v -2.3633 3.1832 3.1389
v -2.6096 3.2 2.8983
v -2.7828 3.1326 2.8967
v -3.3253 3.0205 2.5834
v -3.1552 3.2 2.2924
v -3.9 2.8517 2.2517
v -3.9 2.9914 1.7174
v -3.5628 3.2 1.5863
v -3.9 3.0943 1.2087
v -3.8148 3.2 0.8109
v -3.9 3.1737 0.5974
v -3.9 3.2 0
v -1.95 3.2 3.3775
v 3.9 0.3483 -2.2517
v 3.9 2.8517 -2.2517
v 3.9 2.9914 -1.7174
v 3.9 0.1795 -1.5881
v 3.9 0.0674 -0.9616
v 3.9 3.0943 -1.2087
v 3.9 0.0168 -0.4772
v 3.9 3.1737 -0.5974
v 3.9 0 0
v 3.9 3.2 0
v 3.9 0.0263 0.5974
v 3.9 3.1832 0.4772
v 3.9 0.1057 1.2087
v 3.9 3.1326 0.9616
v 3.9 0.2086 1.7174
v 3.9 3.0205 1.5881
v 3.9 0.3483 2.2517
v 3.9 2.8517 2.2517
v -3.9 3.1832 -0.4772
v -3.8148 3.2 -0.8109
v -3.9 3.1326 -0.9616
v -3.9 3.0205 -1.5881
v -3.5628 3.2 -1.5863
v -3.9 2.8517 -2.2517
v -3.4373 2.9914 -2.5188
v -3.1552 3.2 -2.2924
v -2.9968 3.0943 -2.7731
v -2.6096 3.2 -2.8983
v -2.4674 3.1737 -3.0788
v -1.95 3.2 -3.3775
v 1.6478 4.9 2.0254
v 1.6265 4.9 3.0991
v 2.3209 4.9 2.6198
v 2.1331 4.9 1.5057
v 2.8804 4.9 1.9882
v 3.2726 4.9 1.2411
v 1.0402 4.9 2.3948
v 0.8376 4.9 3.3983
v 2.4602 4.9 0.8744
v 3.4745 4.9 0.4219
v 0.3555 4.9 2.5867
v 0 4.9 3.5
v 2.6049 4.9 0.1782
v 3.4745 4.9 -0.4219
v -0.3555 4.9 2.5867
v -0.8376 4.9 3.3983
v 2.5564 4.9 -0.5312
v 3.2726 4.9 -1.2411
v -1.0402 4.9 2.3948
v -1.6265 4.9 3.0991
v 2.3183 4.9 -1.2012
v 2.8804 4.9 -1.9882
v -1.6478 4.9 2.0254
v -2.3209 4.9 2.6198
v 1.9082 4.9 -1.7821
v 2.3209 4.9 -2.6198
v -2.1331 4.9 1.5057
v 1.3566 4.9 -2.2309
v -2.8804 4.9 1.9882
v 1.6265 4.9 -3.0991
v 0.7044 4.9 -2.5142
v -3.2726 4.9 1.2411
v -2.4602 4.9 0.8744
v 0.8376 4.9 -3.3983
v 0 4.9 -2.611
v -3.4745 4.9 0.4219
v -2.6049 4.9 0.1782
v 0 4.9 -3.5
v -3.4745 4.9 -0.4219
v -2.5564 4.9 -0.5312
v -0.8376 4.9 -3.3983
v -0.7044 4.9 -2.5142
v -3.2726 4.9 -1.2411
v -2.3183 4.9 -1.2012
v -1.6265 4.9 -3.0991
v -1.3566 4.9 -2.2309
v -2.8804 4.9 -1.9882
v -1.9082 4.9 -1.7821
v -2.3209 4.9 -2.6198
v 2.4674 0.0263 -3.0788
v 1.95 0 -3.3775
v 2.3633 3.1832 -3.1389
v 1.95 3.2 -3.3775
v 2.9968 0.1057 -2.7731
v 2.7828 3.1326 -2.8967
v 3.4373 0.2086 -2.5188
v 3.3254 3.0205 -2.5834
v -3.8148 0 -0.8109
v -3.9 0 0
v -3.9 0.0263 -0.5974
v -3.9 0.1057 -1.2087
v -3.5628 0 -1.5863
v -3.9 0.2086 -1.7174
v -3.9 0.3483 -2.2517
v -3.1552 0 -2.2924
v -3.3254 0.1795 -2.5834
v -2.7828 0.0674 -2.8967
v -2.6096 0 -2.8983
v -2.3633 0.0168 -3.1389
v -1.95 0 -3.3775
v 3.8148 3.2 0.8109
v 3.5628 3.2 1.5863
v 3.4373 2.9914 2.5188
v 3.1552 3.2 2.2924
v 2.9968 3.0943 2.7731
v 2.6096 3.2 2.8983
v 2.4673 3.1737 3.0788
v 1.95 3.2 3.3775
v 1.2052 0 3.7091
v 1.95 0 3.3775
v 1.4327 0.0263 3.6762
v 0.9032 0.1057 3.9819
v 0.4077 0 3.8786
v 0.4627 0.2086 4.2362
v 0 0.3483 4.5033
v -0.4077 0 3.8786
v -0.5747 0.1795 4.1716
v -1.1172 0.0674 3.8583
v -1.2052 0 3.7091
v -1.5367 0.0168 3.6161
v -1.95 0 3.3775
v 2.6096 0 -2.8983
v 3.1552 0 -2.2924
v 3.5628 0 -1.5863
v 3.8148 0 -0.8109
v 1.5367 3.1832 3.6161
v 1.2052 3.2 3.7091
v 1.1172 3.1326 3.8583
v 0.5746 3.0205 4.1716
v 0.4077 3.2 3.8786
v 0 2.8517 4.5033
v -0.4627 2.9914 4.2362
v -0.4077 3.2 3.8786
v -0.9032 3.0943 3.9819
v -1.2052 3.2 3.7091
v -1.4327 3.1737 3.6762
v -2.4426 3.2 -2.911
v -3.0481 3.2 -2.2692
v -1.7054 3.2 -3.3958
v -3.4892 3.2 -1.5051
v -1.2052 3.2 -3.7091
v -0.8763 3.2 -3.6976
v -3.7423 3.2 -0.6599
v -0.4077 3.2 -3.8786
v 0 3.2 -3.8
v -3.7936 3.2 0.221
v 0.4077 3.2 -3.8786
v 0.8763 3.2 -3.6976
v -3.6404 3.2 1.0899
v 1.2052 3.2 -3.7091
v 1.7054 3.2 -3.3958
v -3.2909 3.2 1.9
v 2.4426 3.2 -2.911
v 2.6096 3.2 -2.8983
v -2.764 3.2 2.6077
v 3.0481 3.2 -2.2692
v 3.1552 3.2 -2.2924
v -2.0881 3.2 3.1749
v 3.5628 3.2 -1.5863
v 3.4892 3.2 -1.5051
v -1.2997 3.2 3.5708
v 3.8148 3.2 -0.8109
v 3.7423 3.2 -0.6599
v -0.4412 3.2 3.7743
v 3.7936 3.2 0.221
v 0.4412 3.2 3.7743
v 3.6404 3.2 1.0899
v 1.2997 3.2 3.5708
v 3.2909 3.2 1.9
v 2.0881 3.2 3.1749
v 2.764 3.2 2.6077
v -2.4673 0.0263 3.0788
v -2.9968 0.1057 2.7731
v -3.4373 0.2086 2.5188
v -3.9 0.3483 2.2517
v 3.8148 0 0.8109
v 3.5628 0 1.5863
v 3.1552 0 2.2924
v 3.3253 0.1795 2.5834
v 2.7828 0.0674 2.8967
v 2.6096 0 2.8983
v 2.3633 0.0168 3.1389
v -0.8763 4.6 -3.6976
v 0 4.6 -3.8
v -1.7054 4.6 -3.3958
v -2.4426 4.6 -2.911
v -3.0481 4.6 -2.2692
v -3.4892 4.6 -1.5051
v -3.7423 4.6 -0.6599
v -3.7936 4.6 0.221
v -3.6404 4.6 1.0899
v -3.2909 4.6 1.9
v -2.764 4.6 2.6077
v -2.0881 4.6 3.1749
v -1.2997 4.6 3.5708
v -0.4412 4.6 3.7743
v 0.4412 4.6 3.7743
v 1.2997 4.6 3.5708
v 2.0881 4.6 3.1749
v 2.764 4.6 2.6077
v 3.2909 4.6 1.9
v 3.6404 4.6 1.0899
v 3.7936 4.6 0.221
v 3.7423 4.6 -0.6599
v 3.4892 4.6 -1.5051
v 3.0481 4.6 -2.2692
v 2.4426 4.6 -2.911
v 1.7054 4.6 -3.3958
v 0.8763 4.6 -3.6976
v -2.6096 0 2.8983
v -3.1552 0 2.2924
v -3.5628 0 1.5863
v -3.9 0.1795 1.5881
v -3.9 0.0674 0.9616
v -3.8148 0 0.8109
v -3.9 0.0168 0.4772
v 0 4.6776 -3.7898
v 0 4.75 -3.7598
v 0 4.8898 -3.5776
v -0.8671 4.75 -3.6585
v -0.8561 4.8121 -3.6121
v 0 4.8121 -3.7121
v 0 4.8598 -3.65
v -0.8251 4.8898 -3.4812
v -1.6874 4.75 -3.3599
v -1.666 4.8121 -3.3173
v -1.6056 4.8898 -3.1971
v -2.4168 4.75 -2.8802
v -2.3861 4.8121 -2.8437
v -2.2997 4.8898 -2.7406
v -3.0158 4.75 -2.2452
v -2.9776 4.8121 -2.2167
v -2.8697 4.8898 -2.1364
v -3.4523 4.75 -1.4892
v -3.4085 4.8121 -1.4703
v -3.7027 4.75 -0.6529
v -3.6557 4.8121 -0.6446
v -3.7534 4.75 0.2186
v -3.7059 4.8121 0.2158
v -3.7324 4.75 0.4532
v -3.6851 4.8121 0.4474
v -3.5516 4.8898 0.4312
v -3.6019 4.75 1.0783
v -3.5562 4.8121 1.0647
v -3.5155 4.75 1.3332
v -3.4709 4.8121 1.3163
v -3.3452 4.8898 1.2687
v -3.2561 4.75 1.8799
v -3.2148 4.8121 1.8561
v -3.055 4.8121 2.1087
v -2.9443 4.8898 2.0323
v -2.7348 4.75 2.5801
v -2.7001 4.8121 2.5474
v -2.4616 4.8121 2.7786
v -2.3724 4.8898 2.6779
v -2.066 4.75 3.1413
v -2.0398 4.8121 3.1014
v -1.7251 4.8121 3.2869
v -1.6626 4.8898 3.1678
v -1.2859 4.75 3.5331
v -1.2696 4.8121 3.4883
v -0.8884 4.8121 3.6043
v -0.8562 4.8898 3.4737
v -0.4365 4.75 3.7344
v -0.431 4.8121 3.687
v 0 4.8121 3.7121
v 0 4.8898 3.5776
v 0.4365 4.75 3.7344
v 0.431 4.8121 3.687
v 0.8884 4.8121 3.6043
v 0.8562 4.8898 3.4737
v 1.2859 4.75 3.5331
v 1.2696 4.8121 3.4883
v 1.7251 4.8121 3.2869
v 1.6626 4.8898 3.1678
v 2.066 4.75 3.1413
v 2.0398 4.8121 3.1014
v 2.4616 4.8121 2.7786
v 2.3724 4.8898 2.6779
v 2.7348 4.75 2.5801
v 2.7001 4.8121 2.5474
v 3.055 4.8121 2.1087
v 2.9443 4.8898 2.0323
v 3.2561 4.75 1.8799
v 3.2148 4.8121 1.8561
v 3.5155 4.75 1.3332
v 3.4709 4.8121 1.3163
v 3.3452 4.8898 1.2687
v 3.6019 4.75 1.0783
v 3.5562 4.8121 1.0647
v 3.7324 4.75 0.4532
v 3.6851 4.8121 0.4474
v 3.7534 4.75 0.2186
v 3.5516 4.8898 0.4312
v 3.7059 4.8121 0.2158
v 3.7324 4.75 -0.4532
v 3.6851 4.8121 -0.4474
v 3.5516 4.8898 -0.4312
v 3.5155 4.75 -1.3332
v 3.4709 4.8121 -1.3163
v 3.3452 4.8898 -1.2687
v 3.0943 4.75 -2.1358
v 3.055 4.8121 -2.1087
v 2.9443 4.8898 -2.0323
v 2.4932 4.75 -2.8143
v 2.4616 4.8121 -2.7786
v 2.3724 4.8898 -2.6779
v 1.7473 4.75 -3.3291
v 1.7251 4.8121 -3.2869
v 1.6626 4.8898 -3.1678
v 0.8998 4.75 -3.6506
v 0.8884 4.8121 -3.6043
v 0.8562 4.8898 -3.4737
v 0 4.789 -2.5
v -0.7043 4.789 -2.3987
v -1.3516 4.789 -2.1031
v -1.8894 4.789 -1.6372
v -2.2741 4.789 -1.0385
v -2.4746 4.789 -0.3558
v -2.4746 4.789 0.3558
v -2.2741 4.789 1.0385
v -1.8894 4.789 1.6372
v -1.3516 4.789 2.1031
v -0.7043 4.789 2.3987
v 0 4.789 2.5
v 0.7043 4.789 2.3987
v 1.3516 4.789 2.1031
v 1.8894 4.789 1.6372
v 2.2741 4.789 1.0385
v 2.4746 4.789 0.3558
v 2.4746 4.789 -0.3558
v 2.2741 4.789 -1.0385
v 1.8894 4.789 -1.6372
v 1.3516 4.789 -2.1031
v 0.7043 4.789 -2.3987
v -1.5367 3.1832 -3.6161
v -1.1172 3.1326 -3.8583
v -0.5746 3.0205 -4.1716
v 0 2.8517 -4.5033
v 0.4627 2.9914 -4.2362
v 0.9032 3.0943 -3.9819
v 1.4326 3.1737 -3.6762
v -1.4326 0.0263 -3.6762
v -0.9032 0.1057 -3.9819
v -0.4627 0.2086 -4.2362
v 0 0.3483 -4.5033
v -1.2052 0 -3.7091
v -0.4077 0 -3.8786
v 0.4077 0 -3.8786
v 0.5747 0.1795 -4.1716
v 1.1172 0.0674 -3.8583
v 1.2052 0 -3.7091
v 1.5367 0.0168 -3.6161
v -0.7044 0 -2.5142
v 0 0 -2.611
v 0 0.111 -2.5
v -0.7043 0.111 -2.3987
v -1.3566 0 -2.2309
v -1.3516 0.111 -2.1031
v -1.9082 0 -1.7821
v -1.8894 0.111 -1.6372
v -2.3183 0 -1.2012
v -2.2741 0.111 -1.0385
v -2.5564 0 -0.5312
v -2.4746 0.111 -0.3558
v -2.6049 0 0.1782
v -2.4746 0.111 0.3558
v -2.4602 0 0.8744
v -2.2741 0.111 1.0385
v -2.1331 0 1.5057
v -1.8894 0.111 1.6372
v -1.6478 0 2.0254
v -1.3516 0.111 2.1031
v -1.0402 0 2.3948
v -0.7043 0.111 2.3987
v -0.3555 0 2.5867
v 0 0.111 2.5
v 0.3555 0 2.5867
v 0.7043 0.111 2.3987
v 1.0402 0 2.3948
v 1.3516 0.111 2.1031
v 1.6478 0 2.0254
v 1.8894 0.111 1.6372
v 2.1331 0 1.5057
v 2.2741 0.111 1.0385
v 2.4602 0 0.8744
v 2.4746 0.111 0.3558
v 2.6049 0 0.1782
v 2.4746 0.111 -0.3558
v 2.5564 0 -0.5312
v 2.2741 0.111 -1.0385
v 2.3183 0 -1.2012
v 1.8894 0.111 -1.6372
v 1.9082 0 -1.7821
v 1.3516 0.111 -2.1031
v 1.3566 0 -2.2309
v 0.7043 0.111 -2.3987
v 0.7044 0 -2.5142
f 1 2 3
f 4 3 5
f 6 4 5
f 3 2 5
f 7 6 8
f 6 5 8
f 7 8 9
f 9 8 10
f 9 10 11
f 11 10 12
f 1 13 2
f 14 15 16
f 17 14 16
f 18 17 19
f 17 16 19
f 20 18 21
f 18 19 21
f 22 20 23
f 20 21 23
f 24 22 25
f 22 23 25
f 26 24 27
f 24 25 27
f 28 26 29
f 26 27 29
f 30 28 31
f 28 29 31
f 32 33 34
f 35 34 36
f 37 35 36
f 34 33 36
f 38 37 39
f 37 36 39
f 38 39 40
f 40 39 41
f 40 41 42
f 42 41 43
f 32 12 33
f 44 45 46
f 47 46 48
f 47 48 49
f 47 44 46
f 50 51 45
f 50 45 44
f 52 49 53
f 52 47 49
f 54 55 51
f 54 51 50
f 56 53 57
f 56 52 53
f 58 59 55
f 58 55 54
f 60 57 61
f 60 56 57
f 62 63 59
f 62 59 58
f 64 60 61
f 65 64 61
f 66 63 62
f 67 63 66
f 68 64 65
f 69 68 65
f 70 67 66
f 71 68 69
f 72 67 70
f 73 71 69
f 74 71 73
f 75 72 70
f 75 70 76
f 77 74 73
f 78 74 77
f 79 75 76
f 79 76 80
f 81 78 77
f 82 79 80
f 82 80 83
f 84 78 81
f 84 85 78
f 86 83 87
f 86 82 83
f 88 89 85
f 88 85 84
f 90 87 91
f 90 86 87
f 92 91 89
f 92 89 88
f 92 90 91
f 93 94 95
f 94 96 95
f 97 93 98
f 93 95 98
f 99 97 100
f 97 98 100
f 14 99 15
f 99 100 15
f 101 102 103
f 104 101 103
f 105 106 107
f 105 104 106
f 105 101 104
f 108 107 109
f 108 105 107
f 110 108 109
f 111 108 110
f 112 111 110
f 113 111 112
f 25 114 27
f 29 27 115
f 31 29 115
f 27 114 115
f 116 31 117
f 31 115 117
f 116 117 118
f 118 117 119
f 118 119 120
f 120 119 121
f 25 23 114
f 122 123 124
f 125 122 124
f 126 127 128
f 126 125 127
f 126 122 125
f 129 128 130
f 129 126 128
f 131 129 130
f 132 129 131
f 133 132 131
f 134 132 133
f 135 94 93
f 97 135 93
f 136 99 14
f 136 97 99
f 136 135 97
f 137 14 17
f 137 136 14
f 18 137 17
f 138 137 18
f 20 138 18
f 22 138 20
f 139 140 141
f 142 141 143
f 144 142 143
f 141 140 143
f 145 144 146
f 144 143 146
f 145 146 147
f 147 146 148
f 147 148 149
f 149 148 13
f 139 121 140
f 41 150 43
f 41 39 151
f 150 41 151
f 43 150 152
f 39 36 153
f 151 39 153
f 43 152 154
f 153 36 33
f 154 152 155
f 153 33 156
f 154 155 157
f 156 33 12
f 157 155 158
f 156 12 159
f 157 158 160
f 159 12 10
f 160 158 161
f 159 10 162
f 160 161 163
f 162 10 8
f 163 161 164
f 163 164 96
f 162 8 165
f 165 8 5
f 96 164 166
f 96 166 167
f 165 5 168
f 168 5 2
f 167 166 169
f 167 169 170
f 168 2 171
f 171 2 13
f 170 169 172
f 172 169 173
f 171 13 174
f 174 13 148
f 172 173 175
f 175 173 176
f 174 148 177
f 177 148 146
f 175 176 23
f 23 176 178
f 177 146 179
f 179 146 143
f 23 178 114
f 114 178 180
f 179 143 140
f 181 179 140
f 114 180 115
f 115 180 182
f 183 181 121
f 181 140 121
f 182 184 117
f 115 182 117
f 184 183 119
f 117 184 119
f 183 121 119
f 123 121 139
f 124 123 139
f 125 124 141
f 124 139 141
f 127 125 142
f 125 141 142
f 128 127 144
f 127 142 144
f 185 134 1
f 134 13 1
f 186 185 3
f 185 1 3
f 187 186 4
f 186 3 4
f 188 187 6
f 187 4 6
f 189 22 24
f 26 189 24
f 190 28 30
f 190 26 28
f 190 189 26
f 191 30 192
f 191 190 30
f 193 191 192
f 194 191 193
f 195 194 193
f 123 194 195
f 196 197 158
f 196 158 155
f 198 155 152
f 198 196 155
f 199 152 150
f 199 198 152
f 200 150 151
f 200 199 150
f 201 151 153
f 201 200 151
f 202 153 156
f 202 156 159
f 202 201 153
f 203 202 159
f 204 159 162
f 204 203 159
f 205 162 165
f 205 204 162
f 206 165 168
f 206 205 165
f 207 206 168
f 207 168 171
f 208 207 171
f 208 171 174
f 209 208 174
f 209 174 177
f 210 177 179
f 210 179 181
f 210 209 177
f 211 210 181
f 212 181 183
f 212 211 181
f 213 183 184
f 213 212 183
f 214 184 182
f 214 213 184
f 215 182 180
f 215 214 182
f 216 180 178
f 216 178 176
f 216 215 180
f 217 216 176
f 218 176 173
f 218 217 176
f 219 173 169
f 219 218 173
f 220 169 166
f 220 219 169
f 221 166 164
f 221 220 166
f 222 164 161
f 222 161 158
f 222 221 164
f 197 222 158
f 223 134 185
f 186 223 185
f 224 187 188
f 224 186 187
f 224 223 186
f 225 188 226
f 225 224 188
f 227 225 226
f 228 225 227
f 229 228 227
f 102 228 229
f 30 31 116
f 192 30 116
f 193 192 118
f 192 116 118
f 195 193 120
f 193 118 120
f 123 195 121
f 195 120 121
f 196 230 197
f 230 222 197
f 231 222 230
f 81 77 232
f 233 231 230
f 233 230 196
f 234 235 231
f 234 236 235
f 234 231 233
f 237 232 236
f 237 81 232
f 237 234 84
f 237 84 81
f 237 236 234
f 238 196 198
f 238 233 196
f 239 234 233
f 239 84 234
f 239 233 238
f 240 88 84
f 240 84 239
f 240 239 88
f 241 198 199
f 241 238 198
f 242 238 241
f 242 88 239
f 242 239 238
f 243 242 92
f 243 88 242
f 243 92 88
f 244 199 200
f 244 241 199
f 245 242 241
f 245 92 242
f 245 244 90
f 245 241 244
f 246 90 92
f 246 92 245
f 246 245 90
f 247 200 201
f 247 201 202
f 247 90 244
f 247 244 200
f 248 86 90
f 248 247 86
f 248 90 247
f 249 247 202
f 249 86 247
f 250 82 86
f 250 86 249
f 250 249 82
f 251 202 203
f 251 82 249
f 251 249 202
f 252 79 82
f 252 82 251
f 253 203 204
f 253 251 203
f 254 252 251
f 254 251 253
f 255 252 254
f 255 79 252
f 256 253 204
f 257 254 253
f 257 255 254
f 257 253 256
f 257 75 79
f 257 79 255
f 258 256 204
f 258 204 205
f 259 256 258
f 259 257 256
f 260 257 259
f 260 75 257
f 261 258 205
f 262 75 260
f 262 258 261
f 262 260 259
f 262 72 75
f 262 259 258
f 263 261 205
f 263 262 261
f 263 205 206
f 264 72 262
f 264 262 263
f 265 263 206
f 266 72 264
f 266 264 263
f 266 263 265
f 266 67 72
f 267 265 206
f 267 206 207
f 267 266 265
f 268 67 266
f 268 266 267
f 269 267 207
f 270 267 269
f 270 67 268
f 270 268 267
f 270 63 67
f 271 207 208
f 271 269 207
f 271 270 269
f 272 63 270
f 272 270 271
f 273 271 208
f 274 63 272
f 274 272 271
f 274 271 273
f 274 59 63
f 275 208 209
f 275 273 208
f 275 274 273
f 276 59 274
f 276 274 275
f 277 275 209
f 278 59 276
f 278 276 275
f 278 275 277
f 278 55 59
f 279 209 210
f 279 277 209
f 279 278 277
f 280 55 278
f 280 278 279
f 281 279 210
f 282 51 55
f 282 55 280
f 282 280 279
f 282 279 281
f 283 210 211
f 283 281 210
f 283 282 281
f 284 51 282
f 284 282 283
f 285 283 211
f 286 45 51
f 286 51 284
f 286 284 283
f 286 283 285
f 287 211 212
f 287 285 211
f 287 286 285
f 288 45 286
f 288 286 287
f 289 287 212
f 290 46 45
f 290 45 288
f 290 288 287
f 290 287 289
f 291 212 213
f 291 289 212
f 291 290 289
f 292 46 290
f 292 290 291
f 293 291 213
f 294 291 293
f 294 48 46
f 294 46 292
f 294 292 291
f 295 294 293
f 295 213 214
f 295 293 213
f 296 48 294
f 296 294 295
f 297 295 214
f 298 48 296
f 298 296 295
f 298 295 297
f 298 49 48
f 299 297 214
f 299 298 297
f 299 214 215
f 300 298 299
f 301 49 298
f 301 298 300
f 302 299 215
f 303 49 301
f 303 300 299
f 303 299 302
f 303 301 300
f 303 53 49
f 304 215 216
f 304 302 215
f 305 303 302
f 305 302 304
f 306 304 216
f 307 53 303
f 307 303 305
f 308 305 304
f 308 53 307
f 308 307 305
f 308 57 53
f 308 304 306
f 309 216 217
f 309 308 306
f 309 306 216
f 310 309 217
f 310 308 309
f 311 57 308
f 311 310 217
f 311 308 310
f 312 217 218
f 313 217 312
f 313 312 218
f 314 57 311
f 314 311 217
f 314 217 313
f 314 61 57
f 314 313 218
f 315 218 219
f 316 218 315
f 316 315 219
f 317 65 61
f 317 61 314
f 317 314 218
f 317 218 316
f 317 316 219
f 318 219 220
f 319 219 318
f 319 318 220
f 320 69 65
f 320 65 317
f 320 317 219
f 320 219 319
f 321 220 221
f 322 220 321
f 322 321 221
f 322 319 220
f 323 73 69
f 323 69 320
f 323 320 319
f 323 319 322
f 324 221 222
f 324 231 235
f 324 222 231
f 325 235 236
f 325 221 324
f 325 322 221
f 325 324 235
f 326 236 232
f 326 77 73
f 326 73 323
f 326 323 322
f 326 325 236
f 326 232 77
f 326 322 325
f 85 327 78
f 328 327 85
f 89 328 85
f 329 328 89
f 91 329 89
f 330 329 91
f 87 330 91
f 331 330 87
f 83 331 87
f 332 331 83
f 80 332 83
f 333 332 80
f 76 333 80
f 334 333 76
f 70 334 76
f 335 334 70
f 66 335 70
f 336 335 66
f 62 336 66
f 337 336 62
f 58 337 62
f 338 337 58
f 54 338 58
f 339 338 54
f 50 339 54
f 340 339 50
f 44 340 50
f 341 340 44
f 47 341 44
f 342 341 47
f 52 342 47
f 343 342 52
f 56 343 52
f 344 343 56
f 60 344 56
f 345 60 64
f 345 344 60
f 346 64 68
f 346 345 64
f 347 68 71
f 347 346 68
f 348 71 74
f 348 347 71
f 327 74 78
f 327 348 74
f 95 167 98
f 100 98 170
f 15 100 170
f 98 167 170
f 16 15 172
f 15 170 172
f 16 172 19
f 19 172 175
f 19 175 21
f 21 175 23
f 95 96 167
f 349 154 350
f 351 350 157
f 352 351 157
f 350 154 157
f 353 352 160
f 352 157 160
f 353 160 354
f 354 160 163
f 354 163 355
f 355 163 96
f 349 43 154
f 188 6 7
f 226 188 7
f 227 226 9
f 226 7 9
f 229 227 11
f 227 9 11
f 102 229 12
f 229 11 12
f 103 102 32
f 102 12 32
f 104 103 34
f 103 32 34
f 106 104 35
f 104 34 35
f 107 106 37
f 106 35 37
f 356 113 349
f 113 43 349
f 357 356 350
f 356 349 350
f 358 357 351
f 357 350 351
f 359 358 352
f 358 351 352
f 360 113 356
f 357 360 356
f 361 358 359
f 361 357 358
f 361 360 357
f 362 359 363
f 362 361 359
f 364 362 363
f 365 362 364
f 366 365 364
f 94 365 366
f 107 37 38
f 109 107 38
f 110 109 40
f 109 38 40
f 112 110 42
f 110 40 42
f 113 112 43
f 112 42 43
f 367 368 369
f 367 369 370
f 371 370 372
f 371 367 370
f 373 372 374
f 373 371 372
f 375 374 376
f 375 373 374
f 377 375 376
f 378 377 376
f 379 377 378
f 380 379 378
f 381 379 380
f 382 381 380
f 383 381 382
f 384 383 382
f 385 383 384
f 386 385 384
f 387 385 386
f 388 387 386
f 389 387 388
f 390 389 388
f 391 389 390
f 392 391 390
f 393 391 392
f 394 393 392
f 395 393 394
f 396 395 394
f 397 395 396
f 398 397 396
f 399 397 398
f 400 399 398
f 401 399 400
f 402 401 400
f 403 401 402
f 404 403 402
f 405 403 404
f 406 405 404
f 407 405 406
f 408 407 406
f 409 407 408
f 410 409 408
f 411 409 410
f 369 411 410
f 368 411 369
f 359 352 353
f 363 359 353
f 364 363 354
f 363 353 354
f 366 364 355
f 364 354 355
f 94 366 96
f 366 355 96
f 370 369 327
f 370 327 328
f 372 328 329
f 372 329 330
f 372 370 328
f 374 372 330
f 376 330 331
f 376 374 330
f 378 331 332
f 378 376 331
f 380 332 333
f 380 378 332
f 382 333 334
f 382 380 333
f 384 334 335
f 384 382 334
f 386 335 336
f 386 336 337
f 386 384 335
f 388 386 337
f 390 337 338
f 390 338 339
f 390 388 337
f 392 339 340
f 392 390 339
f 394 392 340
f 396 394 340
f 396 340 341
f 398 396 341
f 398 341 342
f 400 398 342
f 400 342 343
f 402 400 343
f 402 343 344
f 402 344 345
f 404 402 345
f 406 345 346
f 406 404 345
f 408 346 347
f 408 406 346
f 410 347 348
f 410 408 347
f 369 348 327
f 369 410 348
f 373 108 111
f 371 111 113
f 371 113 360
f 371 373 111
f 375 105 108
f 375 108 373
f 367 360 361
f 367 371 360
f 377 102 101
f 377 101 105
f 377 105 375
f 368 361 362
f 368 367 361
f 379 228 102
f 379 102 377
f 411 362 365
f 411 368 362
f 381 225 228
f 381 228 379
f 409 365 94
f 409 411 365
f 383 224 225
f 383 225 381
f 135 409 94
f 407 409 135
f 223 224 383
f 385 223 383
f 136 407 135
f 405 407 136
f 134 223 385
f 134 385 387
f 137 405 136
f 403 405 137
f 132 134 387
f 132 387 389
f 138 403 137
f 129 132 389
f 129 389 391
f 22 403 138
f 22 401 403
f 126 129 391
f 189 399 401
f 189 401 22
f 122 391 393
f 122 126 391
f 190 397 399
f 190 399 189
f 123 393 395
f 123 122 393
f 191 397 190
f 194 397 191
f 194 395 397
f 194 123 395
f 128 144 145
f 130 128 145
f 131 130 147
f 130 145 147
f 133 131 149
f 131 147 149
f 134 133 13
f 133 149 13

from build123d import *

# Parameters (mm, degrees)
EXTRUDE_START        = -3.2
EXTRUDE_1_DEPTH      = 3.2
SKETCH_2_3_OUTSIDE_W = 47.018
SKETCH_2_3_OUTSIDE_H = 48.224
SKETCH_2_3_OUTSIDE_R = 3.9
CUT_EXTRUDE_2_DEPTH  = 10
CUT_EXTRUDE_2_DRAFT  = -60
CUT_EXTRUDE_START    = -3.2
SKETCH_2_4_OUTSIDE_W = 53.646
SKETCH_2_4_OUTSIDE_H = 54.852
SKETCH_2_4_OUTSIDE_R = 3.9
CUT_EXTRUDE_3_DEPTH  = 11.91362431
CUT_EXTRUDE_3_DRAFT  = 60
FILLET_1_R           = 0.3
CHAMFER_2_SIZE       = 0.111


with BuildPart() as part:
    # 草图1 → 旋转1 (revolve)
    with BuildSketch(Plane.XY, mode=Mode.PRIVATE) as revolve_1_sk:
        Polygon((3.8, 4.9), (2.5, 4.9), (2.5, 0), (3.9, 0), (3.9, 3.2), (3.8, 3.2), align=None)
    revolve(revolve_1_sk.sketch.rotate(Axis((0, 0, 0), (0, 1, 0)), 90), axis=Axis((0, 0, 0), (0, 1, 0)))

    # 草图2 → 凸台-拉伸1 (add)
    with BuildSketch(Plane.XZ.offset(EXTRUDE_START)):
        with BuildLine():
            Line((1.950000027, 3.377499059), (0, 4.5033321))
            Line((0, 4.5033321), (-1.949999961, 3.377499097))
            ThreePointArc((-1.949999961, 3.377499097), (3.8e-08, 3.9), (1.950000027, 3.377499059))
        make_face()
        with BuildLine():
            ThreePointArc((-3.9, 0), (-3.377499063, 1.95000002), (-1.949999961, 3.377499097))
            Line((-1.949999961, 3.377499097), (-3.9, 2.25166605))
            Line((-3.9, 2.25166605), (-3.9, 0))
        make_face()
        with BuildLine():
            Line((3.9, 2.25166605), (1.950000027, 3.377499059))
            ThreePointArc((1.950000027, 3.377499059), (3.377499083, 1.949999986), (3.9, 0))
            Line((3.9, 0), (3.9, 2.25166605))
        make_face()
        with BuildLine():
            ThreePointArc((-1.950000108, -3.377499013), (-3.377499106, -1.949999946), (-3.9, 0))
            Line((-3.9, 0), (-3.9, -2.25166605))
            Line((-3.9, -2.25166605), (-1.950000108, -3.377499013))
        make_face()
        with BuildLine():
            Line((3.9, -2.25166605), (3.9, 0))
            ThreePointArc((3.9, 0), (3.377499044, -1.950000054), (1.949999892, -3.377499137))
            Line((1.949999892, -3.377499137), (3.9, -2.25166605))
        make_face()
        with BuildLine():
            ThreePointArc((1.949999892, -3.377499137), (-1.25e-07, -3.9), (-1.950000108, -3.377499013))
            Line((-1.950000108, -3.377499013), (0, -4.5033321))
            Line((0, -4.5033321), (1.949999892, -3.377499137))
        make_face()
    extrude(amount=EXTRUDE_1_DEPTH)


with BuildPart() as cut_extrude_2_tool:
    # 草图2<3> outside → 切除-拉伸2 (with draft: the straight prism first)
    with BuildSketch(Plane.XZ):
        Rectangle(SKETCH_2_3_OUTSIDE_W, SKETCH_2_3_OUTSIDE_H)
        Circle(SKETCH_2_3_OUTSIDE_R, mode=Mode.SUBTRACT)
    extrude(amount=-CUT_EXTRUDE_2_DEPTH)
    # 切除-拉伸2: the draft: its side faces are tilted about the plane it starts from
    cut_extrude_2_sides = [cut_extrude_2_tool.faces().sort_by_distance(p)[0] for p in [
        (0, 5, -24.112),
        (23.509, 5, 0),
        (0, 5, 24.112),
        (-23.509, 5, 0),
        (-3.9, 5, 0),
    ]]
    draft(cut_extrude_2_sides, Plane.XZ, CUT_EXTRUDE_2_DRAFT)


with BuildPart() as part_1:
    add(part.part)

    # 切除-拉伸2: cut by cut_extrude_2_tool
    add(cut_extrude_2_tool.part, mode=Mode.SUBTRACT)


with BuildPart() as cut_extrude_3_tool:
    # 草图2<4> outside → 切除-拉伸3 (with draft: the straight prism first)
    with BuildSketch(Plane.XZ.offset(CUT_EXTRUDE_START)):
        Rectangle(SKETCH_2_4_OUTSIDE_W, SKETCH_2_4_OUTSIDE_H)
        Circle(SKETCH_2_4_OUTSIDE_R, mode=Mode.SUBTRACT)
    extrude(amount=CUT_EXTRUDE_3_DEPTH)
    # 切除-拉伸3: the draft: its side faces are tilted about the plane it starts from
    cut_extrude_3_sides = [cut_extrude_3_tool.faces().sort_by_distance(p)[0] for p in [
        (0, -2.756812155, -27.426),
        (26.823, -2.756812155, 0),
        (0, -2.756812155, 27.426),
        (-26.823, -2.756812155, 0),
        (-3.9, -2.756812155, 0),
    ]]
    draft(cut_extrude_3_sides, Plane.XZ.offset(CUT_EXTRUDE_START), CUT_EXTRUDE_3_DRAFT)


with BuildPart() as part_2:
    add(part_1.part)

    # 切除-拉伸3: cut by cut_extrude_3_tool
    add(cut_extrude_3_tool.part, mode=Mode.SUBTRACT)

    # 圆角1
    fillet_1_edges = [part_2.edges().sort_by_distance(p)[0] for p in [
        (0, 4.9, 3.8),
    ]]
    fillet(fillet_1_edges, radius=FILLET_1_R)

    # 倒角2
    chamfer_2_edges = [part_2.edges().sort_by_distance(p)[0] for p in [
        (0, 0, 2.5),
        (0, 4.9, 2.5),
    ]]
    chamfer(chamfer_2_edges, length=CHAMFER_2_SIZE)


solid = part_2.part
